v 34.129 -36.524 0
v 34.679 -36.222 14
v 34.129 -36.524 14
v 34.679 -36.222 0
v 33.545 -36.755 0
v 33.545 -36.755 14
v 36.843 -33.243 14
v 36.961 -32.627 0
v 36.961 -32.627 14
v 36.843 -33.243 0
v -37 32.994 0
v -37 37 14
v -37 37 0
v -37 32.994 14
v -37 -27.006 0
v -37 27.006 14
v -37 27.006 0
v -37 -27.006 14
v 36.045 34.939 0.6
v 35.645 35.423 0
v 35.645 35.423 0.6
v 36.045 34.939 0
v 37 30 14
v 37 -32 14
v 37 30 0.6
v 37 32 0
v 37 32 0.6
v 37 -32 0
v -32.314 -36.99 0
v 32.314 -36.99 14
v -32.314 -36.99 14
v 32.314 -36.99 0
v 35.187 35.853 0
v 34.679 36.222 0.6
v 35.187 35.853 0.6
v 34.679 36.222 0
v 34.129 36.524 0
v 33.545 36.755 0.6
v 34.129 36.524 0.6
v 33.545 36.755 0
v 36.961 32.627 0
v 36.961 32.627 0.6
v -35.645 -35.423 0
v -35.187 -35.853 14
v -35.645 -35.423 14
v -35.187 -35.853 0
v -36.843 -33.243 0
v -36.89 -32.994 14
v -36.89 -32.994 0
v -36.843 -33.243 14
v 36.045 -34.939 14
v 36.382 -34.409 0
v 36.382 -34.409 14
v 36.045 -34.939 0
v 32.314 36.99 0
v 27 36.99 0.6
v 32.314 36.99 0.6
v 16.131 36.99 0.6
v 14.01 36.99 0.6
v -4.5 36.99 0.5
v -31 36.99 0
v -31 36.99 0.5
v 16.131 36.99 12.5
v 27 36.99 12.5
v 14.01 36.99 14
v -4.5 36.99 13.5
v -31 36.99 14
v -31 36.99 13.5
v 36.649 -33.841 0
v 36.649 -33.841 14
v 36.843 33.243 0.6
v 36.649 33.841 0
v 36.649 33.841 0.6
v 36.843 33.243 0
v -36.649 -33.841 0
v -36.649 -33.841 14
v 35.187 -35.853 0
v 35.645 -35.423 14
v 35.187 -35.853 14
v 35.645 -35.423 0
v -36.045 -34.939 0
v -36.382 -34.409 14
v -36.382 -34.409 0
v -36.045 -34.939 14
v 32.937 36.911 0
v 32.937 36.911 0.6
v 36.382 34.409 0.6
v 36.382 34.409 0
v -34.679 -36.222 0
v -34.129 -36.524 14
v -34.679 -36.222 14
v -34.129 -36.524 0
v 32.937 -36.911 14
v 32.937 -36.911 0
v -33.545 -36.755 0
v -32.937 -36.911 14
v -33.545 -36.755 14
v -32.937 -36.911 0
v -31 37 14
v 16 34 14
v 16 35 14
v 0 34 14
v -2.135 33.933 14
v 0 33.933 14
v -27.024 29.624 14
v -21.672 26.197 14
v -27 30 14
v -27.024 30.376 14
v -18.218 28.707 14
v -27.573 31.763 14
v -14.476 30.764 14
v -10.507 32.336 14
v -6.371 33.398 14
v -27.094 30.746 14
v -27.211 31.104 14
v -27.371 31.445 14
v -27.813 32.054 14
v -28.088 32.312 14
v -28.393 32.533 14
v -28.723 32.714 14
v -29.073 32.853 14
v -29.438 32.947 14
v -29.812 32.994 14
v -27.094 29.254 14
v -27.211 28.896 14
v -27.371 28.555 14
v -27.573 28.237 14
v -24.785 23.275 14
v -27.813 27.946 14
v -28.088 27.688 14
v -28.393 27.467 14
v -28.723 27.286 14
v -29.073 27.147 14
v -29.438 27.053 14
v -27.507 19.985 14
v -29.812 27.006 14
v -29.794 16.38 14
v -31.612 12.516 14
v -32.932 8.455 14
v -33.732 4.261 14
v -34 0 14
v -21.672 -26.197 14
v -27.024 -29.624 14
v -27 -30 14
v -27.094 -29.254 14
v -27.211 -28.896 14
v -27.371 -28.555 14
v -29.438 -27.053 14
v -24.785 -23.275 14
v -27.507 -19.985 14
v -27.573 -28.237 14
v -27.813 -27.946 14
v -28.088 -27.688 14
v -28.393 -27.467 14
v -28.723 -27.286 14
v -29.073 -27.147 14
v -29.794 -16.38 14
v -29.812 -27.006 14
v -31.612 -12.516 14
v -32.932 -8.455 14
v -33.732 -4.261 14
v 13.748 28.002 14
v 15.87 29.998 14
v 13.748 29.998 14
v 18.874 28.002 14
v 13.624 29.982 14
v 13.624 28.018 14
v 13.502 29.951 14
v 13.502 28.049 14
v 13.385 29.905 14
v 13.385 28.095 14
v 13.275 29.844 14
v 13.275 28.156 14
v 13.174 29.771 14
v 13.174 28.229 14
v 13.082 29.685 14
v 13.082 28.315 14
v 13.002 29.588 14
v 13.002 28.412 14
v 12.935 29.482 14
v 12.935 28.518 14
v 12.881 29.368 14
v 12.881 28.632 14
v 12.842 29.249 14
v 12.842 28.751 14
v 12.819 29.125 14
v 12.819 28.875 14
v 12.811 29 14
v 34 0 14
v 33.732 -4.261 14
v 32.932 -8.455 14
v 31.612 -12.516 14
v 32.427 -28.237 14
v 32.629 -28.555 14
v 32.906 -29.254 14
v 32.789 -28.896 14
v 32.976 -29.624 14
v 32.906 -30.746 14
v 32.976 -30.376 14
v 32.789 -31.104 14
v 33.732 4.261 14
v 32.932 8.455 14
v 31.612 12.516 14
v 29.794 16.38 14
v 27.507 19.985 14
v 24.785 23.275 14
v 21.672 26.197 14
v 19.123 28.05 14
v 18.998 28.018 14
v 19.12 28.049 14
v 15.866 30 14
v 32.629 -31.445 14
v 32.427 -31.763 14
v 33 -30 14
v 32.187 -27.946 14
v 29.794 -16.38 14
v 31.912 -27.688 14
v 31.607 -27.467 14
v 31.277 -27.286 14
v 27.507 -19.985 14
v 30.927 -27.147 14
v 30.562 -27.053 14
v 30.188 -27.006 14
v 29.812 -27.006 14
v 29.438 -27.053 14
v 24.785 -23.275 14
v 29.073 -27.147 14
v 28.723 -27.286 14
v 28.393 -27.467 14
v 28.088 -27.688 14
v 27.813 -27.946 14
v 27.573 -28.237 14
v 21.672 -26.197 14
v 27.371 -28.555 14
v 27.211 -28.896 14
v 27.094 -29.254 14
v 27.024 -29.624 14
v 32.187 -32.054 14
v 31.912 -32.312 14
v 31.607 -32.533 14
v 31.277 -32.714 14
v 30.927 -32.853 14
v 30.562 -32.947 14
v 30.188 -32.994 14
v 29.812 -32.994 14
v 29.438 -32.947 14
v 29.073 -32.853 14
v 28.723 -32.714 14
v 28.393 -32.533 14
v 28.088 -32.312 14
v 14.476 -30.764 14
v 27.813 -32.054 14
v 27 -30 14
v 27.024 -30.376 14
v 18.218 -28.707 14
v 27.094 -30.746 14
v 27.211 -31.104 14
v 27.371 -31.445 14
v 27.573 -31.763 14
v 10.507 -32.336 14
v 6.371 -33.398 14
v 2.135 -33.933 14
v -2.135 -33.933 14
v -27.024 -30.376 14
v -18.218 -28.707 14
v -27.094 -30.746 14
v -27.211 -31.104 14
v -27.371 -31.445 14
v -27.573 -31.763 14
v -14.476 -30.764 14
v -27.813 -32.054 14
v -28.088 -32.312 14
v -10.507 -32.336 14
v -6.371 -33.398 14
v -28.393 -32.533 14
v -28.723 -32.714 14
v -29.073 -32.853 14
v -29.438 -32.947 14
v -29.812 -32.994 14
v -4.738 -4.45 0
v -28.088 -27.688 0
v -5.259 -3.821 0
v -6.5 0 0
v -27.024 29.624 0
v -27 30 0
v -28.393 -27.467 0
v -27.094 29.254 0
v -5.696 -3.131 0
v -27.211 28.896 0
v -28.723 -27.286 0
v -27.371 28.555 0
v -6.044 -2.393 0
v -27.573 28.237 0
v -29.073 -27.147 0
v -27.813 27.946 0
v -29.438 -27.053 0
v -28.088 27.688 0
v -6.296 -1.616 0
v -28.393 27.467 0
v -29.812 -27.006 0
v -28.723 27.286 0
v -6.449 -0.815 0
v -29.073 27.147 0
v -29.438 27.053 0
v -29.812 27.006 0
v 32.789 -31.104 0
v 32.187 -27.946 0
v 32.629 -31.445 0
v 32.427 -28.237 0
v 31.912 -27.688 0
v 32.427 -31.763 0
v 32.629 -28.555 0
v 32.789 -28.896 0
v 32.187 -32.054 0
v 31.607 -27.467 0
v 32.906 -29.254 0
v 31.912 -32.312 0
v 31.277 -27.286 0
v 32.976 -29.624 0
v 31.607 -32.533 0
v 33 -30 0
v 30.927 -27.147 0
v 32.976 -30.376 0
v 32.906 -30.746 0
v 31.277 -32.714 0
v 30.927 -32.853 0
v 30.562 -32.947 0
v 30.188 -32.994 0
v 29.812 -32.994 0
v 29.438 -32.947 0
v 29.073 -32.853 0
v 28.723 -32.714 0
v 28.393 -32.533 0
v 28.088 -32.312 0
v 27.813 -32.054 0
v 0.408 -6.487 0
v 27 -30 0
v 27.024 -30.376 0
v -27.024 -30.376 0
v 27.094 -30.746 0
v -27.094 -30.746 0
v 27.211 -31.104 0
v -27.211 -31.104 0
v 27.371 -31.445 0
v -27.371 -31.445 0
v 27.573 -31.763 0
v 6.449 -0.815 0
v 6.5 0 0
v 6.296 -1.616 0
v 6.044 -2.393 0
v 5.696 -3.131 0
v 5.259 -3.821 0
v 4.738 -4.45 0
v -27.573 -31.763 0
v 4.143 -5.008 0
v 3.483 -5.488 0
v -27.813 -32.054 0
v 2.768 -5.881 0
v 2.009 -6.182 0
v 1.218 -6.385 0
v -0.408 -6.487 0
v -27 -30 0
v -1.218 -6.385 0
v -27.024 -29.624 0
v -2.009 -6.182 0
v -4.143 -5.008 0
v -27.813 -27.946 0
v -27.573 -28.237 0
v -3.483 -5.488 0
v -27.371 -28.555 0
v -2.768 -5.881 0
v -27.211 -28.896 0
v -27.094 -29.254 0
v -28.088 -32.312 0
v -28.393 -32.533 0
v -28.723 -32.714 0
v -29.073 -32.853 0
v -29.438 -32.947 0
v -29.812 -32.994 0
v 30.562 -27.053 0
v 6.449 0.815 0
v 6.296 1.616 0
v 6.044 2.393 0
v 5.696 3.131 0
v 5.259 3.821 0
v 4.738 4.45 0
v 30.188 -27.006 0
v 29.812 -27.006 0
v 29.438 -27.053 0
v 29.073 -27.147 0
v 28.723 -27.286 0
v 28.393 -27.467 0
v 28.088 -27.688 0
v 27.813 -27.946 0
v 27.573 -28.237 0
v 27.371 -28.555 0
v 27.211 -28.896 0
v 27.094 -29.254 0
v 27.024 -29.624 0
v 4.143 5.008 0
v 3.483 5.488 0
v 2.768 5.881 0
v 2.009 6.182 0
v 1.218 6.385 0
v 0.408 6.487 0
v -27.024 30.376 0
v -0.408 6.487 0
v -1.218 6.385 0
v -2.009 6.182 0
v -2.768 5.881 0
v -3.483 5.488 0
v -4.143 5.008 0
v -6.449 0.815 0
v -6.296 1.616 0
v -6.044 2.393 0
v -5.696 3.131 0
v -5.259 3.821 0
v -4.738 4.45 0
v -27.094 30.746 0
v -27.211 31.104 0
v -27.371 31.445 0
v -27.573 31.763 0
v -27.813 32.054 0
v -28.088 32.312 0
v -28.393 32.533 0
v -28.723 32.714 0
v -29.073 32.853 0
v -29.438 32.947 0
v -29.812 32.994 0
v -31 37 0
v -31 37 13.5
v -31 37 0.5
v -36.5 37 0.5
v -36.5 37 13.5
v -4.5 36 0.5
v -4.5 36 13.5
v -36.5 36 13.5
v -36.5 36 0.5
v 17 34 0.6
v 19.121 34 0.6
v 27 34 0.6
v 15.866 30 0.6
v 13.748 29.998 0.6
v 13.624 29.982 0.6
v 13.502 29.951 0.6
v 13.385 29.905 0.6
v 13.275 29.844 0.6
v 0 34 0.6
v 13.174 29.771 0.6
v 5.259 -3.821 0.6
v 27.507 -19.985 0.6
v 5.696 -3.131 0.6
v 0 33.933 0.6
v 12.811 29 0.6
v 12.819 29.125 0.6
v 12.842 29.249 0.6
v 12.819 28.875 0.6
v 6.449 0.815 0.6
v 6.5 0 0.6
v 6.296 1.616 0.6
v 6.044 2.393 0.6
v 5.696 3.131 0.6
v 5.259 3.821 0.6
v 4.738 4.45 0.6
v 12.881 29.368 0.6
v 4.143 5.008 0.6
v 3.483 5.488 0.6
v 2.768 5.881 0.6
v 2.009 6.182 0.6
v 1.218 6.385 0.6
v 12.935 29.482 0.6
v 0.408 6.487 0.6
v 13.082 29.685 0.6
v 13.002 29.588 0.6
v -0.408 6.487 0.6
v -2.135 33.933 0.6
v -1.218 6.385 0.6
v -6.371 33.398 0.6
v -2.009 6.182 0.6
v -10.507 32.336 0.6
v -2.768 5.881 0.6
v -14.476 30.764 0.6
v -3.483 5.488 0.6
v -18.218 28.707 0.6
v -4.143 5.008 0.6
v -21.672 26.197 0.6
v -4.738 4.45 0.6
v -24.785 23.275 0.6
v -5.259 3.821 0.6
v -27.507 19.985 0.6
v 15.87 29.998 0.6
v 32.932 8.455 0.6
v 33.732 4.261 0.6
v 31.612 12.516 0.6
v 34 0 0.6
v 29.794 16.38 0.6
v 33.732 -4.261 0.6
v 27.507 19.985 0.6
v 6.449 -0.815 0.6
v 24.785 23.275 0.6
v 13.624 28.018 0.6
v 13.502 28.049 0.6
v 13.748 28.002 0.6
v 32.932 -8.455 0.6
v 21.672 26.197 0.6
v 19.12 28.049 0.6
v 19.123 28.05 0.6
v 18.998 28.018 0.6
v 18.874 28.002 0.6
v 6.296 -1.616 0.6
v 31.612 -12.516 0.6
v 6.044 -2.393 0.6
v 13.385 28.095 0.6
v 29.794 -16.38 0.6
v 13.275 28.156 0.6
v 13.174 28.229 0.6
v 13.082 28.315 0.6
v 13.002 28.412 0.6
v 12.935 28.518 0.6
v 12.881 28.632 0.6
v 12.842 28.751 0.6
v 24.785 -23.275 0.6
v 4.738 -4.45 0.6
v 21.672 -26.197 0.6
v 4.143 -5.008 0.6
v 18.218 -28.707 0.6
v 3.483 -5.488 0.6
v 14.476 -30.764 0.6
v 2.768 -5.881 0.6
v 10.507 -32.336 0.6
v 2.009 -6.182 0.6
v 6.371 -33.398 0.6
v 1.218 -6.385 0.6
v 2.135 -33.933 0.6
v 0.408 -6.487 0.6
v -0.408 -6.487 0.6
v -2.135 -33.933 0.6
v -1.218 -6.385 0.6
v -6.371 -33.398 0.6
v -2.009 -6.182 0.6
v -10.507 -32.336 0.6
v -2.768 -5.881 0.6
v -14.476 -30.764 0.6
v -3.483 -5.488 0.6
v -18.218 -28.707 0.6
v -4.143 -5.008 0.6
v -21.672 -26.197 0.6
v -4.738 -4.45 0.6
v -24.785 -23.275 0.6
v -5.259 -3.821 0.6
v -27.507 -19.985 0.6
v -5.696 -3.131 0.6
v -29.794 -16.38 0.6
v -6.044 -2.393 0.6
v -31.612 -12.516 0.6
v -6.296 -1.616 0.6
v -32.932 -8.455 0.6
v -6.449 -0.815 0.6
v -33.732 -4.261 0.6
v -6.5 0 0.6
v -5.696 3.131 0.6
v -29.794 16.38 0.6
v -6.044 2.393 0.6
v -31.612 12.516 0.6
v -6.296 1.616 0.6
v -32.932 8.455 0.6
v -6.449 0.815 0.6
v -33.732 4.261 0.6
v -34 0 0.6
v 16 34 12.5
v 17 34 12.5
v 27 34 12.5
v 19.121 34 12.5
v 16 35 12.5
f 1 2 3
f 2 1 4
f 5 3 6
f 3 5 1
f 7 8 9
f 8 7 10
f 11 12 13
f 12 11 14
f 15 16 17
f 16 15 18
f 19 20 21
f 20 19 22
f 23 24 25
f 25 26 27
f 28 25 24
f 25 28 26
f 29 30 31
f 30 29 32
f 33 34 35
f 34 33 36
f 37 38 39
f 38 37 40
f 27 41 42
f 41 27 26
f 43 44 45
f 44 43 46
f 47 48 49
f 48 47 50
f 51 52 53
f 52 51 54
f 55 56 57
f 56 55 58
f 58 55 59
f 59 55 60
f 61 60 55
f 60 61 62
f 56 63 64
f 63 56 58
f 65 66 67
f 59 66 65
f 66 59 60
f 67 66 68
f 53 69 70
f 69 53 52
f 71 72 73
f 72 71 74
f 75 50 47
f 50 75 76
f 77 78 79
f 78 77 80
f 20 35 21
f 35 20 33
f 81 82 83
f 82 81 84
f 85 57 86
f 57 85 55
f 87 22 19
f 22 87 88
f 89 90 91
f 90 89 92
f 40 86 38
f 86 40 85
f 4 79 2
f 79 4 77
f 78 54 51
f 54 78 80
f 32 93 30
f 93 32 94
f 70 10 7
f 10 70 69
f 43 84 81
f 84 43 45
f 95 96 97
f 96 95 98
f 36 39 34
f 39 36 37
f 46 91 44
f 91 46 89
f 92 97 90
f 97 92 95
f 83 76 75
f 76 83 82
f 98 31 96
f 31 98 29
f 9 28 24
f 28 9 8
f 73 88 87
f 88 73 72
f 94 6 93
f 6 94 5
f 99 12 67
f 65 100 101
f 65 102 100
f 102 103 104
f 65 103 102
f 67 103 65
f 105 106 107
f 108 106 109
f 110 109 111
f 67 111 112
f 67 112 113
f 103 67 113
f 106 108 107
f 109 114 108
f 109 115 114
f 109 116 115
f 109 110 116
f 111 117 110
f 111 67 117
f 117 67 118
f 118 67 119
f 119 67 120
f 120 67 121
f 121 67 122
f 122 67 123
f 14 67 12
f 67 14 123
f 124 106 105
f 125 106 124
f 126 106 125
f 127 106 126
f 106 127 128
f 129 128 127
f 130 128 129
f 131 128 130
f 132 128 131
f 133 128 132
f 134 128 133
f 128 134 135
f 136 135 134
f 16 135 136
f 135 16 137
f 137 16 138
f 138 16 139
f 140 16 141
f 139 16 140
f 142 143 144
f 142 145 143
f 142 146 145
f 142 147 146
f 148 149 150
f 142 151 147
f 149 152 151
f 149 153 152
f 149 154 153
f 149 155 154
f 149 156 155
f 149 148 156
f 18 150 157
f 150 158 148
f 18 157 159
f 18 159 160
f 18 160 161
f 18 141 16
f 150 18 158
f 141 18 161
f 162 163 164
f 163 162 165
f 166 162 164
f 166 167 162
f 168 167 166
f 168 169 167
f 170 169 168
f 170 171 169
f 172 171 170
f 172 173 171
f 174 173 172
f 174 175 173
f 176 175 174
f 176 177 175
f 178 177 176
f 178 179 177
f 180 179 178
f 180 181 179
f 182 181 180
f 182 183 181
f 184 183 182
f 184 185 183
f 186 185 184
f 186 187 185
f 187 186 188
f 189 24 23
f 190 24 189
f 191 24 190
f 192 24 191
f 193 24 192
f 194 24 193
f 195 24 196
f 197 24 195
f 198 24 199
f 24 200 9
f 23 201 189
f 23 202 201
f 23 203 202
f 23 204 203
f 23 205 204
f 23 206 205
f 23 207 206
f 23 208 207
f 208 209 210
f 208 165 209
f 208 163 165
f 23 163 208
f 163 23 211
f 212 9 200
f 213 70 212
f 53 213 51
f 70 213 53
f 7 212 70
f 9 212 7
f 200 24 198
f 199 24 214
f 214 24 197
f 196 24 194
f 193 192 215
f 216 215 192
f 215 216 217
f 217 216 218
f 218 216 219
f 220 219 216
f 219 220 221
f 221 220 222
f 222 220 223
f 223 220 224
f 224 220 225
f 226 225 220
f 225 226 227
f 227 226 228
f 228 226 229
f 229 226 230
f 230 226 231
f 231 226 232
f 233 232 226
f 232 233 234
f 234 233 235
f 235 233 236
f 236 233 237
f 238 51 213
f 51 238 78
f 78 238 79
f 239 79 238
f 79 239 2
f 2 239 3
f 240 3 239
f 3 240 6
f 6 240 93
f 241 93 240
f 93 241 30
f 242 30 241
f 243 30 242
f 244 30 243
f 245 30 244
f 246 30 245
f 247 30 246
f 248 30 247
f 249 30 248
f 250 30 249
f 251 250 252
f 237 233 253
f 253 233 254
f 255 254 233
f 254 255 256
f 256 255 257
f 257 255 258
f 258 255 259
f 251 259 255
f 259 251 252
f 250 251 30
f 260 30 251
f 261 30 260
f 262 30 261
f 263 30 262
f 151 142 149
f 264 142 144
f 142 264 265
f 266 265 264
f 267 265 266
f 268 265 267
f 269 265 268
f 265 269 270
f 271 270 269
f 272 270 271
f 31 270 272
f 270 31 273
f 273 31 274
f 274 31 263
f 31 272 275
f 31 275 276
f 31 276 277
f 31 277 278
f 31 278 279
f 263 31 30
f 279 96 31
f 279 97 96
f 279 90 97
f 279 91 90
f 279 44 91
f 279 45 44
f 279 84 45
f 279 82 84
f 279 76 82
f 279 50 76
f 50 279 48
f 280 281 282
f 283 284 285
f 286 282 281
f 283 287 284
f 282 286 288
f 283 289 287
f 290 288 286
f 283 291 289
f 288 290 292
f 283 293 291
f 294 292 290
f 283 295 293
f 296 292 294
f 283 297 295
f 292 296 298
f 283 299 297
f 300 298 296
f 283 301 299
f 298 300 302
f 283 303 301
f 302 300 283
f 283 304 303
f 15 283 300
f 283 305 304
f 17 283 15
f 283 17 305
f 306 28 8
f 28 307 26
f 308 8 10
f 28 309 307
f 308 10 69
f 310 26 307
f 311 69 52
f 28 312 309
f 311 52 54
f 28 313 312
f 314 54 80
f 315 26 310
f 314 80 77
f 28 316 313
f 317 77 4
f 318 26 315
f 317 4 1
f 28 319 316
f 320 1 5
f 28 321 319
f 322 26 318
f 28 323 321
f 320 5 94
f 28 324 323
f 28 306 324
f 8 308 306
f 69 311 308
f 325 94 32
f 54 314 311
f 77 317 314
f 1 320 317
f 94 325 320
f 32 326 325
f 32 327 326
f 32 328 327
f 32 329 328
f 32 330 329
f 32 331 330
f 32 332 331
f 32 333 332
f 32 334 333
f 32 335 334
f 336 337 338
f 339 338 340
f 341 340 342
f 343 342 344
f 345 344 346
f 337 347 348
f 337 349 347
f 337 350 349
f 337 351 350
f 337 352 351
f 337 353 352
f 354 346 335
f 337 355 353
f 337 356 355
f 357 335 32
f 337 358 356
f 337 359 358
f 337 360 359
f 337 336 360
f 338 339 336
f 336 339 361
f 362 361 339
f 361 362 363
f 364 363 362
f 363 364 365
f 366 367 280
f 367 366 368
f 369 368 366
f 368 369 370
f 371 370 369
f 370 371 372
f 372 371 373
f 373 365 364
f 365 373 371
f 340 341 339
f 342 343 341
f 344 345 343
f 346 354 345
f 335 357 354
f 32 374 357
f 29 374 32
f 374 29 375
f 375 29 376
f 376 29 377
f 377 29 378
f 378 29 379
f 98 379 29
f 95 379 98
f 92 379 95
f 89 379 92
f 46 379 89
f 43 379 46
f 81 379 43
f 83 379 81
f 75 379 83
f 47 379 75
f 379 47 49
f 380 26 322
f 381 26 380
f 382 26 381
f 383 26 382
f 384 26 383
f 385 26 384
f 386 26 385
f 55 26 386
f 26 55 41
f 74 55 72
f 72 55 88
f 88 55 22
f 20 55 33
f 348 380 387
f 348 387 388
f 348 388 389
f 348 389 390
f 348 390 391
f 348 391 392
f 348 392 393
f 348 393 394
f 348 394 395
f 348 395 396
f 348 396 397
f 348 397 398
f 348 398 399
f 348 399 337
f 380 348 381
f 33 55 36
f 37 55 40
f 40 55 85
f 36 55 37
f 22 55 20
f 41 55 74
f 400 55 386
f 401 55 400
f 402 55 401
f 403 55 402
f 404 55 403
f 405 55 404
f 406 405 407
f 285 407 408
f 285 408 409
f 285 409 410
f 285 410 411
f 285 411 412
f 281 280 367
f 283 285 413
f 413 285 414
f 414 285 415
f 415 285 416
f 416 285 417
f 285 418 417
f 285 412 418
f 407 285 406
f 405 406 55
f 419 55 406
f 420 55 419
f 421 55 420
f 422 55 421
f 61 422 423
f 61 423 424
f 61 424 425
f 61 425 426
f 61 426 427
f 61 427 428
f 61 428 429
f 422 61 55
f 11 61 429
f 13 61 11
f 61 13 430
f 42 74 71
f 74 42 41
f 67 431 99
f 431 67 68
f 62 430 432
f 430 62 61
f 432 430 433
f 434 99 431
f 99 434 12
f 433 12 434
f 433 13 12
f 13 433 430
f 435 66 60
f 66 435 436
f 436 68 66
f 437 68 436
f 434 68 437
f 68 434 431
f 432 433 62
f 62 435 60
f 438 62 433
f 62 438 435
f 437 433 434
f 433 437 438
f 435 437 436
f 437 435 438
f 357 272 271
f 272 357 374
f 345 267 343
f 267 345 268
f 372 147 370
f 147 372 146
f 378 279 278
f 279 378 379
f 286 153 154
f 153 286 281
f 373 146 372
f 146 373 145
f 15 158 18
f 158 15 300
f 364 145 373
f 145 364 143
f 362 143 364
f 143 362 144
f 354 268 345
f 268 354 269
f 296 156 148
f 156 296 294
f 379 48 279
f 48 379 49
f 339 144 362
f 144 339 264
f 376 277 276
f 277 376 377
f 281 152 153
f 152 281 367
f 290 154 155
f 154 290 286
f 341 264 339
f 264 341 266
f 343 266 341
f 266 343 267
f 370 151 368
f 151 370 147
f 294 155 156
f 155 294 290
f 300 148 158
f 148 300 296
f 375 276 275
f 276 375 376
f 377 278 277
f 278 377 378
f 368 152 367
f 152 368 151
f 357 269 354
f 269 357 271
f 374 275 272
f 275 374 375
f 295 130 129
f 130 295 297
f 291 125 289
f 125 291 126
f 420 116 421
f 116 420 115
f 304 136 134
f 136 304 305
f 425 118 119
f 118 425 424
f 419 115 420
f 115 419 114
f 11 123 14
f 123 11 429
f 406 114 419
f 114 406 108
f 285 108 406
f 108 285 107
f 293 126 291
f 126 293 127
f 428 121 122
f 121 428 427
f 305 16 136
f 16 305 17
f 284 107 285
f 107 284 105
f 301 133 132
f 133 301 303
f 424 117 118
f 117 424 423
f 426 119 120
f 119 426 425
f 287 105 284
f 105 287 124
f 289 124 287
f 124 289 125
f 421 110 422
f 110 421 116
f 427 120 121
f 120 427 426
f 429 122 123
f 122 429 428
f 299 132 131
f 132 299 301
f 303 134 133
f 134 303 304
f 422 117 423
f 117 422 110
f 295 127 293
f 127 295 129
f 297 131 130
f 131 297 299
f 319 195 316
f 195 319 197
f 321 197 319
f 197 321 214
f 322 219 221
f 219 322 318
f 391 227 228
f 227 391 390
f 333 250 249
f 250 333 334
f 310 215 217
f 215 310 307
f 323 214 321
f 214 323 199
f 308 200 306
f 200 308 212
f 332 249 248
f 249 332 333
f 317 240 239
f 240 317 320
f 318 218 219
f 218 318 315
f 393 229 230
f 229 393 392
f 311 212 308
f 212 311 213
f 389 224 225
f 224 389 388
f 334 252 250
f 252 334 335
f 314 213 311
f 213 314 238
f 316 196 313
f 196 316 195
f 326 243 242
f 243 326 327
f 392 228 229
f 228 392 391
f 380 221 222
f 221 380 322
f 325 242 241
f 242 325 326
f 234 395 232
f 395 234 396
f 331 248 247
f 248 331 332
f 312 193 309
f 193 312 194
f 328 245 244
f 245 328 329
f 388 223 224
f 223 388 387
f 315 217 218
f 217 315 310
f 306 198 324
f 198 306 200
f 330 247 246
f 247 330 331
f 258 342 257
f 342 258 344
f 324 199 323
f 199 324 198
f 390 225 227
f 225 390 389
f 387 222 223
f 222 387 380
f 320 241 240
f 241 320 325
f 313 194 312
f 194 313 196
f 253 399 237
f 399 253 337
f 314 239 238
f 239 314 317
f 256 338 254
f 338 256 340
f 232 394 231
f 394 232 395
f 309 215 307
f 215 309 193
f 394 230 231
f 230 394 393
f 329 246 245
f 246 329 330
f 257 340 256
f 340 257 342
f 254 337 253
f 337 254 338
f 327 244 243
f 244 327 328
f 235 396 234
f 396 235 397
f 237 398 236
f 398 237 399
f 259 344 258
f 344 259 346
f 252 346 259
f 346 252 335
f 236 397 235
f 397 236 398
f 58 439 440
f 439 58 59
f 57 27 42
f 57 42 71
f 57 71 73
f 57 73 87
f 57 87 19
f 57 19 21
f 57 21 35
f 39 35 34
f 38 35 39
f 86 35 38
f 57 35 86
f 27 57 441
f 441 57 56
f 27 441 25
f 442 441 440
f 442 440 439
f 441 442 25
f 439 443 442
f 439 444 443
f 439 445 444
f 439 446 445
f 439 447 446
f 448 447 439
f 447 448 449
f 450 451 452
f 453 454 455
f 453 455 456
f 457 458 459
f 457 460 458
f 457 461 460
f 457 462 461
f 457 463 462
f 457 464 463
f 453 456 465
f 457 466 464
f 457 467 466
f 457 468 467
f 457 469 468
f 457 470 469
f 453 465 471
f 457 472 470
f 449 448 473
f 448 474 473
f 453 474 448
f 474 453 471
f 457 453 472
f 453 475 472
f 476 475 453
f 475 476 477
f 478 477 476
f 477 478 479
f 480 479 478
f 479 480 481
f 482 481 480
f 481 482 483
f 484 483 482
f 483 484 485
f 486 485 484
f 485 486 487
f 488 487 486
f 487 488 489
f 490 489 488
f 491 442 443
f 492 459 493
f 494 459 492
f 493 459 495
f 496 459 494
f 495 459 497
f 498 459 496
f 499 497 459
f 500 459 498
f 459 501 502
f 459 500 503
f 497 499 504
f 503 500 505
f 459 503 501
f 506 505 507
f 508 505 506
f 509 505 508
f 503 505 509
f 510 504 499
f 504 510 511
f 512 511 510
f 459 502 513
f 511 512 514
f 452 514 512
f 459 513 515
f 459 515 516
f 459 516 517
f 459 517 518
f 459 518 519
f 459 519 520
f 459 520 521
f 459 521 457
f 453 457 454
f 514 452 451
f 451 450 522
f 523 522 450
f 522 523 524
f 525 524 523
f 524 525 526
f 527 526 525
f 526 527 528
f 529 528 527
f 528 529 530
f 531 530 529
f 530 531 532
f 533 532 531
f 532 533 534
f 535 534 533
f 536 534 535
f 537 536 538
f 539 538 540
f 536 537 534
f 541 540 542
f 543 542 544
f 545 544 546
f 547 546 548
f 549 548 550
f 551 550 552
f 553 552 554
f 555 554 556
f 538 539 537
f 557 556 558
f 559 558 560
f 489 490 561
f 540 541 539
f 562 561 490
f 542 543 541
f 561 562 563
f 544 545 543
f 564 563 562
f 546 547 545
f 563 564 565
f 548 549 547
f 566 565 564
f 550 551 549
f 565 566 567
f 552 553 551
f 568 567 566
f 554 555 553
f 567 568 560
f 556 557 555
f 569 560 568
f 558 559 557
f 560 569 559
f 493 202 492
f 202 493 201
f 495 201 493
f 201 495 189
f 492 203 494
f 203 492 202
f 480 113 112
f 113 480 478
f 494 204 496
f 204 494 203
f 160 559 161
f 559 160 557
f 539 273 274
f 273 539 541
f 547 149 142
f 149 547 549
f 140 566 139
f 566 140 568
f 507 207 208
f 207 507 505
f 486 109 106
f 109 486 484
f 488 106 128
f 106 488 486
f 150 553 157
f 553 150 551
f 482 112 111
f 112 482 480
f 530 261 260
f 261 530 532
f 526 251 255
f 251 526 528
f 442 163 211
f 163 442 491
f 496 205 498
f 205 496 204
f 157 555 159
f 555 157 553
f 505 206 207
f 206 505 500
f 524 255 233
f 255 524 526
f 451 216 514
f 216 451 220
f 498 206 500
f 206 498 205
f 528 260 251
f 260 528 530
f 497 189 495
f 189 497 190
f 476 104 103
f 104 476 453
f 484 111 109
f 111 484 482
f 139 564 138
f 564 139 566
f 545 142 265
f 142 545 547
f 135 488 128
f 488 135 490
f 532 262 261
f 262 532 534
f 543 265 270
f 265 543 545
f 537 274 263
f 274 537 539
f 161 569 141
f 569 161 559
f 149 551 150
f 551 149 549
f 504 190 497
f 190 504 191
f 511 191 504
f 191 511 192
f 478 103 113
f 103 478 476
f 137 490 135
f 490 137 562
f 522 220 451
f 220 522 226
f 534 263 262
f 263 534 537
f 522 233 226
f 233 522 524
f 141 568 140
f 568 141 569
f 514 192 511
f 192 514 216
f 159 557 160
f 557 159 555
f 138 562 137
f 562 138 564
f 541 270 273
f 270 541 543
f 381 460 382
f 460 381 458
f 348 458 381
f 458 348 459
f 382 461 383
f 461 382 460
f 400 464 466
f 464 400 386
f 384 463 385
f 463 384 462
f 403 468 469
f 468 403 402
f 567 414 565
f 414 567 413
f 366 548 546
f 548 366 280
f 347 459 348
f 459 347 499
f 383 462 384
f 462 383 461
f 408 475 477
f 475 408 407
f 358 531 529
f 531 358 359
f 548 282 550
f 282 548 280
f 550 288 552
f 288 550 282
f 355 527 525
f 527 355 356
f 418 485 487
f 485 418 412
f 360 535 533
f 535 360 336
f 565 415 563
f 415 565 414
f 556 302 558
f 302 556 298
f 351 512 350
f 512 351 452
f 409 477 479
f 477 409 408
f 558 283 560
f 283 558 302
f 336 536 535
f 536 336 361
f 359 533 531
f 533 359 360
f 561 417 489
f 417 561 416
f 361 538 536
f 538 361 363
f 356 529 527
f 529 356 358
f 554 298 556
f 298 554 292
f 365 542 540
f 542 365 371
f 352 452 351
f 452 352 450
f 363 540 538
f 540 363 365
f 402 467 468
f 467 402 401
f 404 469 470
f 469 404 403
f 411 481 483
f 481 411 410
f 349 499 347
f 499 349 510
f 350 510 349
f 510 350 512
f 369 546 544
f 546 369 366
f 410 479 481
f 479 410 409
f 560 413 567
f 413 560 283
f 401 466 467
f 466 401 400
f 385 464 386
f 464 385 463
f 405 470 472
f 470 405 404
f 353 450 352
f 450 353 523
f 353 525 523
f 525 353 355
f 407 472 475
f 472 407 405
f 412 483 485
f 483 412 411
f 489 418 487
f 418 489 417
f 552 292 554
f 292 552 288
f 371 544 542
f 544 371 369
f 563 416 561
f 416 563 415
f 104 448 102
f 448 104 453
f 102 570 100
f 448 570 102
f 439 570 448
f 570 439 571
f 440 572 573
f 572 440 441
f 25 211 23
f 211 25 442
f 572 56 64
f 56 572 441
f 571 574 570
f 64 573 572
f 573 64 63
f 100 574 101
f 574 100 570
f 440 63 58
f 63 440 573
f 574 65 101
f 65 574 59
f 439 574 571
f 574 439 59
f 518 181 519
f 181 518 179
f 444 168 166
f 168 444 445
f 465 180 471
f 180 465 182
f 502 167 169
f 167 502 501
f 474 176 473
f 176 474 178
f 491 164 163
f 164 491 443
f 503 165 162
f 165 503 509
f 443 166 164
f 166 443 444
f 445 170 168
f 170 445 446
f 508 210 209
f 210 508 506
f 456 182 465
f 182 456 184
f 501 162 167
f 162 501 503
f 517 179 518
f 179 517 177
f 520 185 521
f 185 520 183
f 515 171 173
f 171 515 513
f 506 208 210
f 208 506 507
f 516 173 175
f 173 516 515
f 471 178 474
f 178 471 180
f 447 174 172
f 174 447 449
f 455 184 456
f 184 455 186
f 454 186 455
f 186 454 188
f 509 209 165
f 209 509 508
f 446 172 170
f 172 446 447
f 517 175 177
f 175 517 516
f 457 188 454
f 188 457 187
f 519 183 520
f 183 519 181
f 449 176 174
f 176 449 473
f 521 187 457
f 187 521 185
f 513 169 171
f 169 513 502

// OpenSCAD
$fn = 50;


union() {
	difference() {
		union() {
			translate(v = [0, 0, 0]) {
				rotate(a = [0, 0, 0]) {
					hull() {
						translate(v = [-32.0000000000, 32.0000000000, 0]) {
							rotate(a = [0, 0, 0]) {
								translate(v = [0, 0, 0]) {
									rotate(a = [0, 0, 0]) {
										cylinder(h = 14, r = 5);
									}
								}
							}
						}
						translate(v = [32.0000000000, 32.0000000000, 0]) {
							rotate(a = [0, 0, 0]) {
								translate(v = [0, 0, 0]) {
									rotate(a = [0, 0, 0]) {
										cylinder(h = 14, r = 5);
									}
								}
							}
						}
						translate(v = [-32.0000000000, -32.0000000000, 0]) {
							rotate(a = [0, 0, 0]) {
								translate(v = [0, 0, 0]) {
									rotate(a = [0, 0, 0]) {
										cylinder(h = 14, r = 5);
									}
								}
							}
						}
						translate(v = [32.0000000000, -32.0000000000, 0]) {
							rotate(a = [0, 0, 0]) {
								translate(v = [0, 0, 0]) {
									rotate(a = [0, 0, 0]) {
										cylinder(h = 14, r = 5);
									}
								}
							}
						}
					}
				}
			}
			translate(v = [-37.0000000000, 31.0000000000, 0]) {
				rotate(a = [0, 0, 0]) {
					cube(size = [6, 6, 14]);
				}
			}
		}
		union() {
			#translate(v = [-36.5000000000, 36.0000000000, 0.5000000000]) {
				rotate(a = [0, 0, 0]) {
					cube(size = [32, 1, 13.0000000000]);
				}
			}
			translate(v = [-37.5000000000, -30.0000000000, -125]) {
				rotate(a = [0, 0, 0]) {
					hull() {
						translate(v = [7.5000000000, 0, 0]) {
							rotate(a = [0, 0, 0]) {
								translate(v = [0, 0, 0]) {
									rotate(a = [0, 0, 0]) {
										cylinder(h = 250, r = 3.0000000000);
									}
								}
							}
						}
						translate(v = [-7.5000000000, 0, 0]) {
							rotate(a = [0, 0, 0]) {
								translate(v = [0, 0, 0]) {
									rotate(a = [0, 0, 0]) {
										cylinder(h = 250, r = 3.0000000000);
									}
								}
							}
						}
					}
				}
			}
			translate(v = [-37.5000000000, 30.0000000000, -125]) {
				rotate(a = [0, 0, 0]) {
					hull() {
						translate(v = [7.5000000000, 0, 0]) {
							rotate(a = [0, 0, 0]) {
								translate(v = [0, 0, 0]) {
									rotate(a = [0, 0, 0]) {
										cylinder(h = 250, r = 3.0000000000);
									}
								}
							}
						}
						translate(v = [-7.5000000000, 0, 0]) {
							rotate(a = [0, 0, 0]) {
								translate(v = [0, 0, 0]) {
									rotate(a = [0, 0, 0]) {
										cylinder(h = 250, r = 3.0000000000);
									}
								}
							}
						}
					}
				}
			}
			translate(v = [30.0000000000, -30.0000000000, -125.0000000000]) {
				rotate(a = [0, 0, 0]) {
					cylinder(h = 250, r = 3.0000000000);
				}
			}
			translate(v = [0, 0, 0.6000000000]) {
				rotate(a = [0, 0, 0]) {
					cylinder(h = 16.4000000000, r = 34.0000000000);
				}
			}
			translate(v = [0, 0, -7.0000000000]) {
				rotate(a = [0, 0, 0]) {
					cylinder(h = 14, r = 6.5000000000);
				}
			}
			translate(v = [0.0000000000, 30.0000000000, 0.6000000000]) {
				rotate(a = [0, 0, 0]) {
					cube(size = [37.0000000000, 4, 16.4000000000]);
				}
			}
			translate(v = [27.0000000000, 30.0000000000, 0.6000000000]) {
				rotate(a = [0, 0, 0]) {
					cube(size = [10, 7, 16.4000000000]);
				}
			}
			translate(v = [16.0000000000, 30.0000000000, 12.5000000000]) {
				rotate(a = [0, 0, 0]) {
					cube(size = [21, 7, 1.5000000000]);
				}
			}
			translate(v = [13.2500000000, 37.7500000000, 0.6000000000]) {
				rotate(a = [0, 0, -45]) {
					cube(size = [7.5000000000, 1.5000000000, 16.4000000000]);
				}
			}
			translate(v = [7.0610000000, 28.0000000000, 0.6000000000]) {
				rotate(a = [0, 0, 0]) {
					cube(size = [7.5000000000, 2, 13.4000000000]);
				}
			}
		}
	}
	union() {
		translate(v = [16.3110000000, 29.0000000000, 0]) {
			rotate(a = [0, 0, 0]) {
				hull() {
					translate(v = [2.5000000000, 0, 0]) {
						rotate(a = [0, 0, 0]) {
							#translate(v = [0, 0, 0]) {
								rotate(a = [0, 0, 0]) {
									cylinder(h = 14, r = 1.0000000000);
								}
							}
						}
					}
					translate(v = [-2.5000000000, 0, 0]) {
						rotate(a = [0, 0, 0]) {
							#translate(v = [0, 0, 0]) {
								rotate(a = [0, 0, 0]) {
									cylinder(h = 14, r = 1.0000000000);
								}
							}
						}
					}
				}
			}
		}
	}
}
